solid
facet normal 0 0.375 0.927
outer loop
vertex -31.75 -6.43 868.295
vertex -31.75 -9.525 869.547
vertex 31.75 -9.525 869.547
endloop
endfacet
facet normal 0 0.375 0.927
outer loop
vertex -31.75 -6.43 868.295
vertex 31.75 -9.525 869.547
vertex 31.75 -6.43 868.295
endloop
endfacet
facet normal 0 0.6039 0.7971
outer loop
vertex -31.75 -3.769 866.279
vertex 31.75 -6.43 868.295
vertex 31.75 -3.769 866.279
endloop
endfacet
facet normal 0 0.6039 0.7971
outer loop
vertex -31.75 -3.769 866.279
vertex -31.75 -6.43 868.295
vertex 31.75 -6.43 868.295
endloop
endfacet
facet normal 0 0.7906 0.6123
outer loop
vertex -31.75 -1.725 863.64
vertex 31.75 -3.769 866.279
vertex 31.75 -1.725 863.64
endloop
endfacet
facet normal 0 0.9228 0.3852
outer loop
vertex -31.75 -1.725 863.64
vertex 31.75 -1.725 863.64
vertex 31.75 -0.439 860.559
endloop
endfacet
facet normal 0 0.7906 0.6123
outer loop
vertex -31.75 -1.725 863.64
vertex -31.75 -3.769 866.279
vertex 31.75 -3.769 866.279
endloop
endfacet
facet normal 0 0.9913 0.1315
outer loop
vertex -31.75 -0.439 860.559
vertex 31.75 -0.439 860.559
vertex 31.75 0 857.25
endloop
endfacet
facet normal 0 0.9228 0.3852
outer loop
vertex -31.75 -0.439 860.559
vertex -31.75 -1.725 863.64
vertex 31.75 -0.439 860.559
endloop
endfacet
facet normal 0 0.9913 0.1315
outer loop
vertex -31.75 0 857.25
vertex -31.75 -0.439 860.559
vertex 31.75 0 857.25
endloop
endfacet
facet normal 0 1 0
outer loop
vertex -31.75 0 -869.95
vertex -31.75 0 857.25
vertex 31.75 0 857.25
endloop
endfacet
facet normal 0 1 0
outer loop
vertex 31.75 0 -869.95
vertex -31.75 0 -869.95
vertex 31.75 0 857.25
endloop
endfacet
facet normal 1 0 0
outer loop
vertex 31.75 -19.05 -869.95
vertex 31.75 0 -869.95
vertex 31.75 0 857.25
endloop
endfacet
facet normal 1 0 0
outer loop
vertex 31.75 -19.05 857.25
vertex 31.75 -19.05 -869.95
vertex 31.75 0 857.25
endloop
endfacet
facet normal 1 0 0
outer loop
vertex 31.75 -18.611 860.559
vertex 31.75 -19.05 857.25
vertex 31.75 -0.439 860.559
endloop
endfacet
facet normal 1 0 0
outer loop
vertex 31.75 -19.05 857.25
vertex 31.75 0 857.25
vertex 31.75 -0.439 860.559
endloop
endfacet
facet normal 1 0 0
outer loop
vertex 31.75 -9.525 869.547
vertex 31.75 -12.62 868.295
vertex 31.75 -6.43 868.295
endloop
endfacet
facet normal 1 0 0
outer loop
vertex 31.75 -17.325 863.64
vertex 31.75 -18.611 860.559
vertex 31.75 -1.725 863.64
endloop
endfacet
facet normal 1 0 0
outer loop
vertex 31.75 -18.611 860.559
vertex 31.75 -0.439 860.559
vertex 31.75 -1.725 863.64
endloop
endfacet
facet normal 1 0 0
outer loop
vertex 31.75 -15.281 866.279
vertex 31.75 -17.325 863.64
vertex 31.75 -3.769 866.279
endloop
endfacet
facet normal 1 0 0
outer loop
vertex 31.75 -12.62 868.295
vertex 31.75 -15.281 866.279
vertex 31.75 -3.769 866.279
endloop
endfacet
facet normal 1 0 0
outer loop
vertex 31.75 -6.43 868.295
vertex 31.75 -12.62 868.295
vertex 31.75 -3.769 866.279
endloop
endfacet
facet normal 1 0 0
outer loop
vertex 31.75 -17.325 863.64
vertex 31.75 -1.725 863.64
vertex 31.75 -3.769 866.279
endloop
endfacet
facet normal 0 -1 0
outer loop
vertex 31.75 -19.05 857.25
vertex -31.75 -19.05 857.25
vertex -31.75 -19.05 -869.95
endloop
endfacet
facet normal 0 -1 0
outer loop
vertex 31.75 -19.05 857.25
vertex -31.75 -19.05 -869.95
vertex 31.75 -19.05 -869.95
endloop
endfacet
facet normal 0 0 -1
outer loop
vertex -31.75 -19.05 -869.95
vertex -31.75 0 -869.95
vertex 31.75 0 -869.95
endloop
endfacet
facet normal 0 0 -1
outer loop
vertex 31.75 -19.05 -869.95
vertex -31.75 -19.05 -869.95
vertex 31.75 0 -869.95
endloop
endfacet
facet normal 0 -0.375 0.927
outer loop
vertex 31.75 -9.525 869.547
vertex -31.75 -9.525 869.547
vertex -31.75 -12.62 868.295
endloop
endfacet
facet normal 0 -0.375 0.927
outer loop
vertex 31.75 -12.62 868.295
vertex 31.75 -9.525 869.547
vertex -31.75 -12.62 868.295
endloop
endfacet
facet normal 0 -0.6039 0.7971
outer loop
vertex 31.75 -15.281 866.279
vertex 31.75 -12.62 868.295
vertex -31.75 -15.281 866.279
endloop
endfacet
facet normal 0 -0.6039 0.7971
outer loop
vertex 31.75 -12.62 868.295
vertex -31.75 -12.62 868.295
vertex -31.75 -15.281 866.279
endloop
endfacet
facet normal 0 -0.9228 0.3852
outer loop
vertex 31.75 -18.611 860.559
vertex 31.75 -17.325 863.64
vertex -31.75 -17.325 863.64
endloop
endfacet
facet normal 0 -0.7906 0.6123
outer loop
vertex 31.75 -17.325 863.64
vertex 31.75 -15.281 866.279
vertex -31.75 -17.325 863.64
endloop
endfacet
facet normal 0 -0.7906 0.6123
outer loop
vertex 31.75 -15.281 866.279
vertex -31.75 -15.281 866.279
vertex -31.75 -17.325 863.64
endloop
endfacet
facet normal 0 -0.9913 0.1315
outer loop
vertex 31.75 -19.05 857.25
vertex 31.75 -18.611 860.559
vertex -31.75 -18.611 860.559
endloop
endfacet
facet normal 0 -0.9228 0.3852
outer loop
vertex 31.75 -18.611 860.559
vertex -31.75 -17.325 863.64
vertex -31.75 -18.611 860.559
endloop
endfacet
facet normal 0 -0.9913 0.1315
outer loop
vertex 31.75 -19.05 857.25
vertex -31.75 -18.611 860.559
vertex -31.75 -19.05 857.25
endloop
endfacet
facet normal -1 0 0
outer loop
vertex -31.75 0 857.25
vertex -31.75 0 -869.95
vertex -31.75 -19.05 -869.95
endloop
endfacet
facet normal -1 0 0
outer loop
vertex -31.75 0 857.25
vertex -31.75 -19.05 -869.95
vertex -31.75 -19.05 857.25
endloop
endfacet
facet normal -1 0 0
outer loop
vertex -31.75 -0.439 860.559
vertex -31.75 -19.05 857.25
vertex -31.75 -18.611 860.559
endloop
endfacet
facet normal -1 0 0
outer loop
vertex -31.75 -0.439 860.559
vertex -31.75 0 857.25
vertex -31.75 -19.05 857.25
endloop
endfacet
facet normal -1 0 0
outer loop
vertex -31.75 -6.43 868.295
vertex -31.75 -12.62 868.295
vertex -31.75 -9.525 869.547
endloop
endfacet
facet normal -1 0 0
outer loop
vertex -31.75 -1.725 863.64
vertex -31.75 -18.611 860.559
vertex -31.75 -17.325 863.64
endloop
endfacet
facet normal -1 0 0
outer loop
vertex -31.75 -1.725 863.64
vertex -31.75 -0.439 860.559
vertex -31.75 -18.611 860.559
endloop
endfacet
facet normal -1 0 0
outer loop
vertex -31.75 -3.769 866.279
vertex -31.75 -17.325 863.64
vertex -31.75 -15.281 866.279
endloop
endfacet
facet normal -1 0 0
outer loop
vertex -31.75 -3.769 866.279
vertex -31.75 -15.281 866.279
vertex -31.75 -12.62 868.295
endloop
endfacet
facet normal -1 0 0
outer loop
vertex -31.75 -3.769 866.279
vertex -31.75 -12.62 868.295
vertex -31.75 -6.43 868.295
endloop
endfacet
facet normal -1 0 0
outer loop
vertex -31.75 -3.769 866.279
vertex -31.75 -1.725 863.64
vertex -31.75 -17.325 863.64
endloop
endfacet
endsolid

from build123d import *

# Parameters (mm, degrees)
F0_W        = 63.5
F0_H        = 1739.9
F1_DEPTH    = 19.05
F2_T1_DEPTH = 127


# Not quite as in the source:
# - a fillet or chamfer that OpenCascade refuses, or shapes differently, is made with other operations: its cross-section is extruded or revolved along the edge and cut away or added


with BuildPart() as f1:
    # F0 (on Front) → F1 (new body)
    with BuildSketch(Plane.XZ):
        Rectangle(F0_W, F0_H)
    extrude(amount=F1_DEPTH)

    # F2: fillet of radius 12.7 on 2 edges, made by hand

    # F2_s2 → F2_t1 (cut)
    with BuildSketch(Plane.YZ.offset(-63.5)):
        with BuildLine():
            ThreePointArc((-6.35, 869.95), (-15.3302561211, 866.2302561211), (-19.05, 857.25))
            Line((-19.05, 857.25), (-19.05, 869.95))
            Line((-19.05, 869.95), (-6.35, 869.95))
        make_face()
        with BuildLine():
            ThreePointArc((-12.7, 869.95), (-3.7197438789, 866.2302561211), (0, 857.25))
            Line((0, 857.25), (0, 869.95))
            Line((0, 869.95), (-12.7, 869.95))
        make_face()
    extrude(amount=F2_T1_DEPTH, mode=Mode.SUBTRACT)


solid = f1.part
